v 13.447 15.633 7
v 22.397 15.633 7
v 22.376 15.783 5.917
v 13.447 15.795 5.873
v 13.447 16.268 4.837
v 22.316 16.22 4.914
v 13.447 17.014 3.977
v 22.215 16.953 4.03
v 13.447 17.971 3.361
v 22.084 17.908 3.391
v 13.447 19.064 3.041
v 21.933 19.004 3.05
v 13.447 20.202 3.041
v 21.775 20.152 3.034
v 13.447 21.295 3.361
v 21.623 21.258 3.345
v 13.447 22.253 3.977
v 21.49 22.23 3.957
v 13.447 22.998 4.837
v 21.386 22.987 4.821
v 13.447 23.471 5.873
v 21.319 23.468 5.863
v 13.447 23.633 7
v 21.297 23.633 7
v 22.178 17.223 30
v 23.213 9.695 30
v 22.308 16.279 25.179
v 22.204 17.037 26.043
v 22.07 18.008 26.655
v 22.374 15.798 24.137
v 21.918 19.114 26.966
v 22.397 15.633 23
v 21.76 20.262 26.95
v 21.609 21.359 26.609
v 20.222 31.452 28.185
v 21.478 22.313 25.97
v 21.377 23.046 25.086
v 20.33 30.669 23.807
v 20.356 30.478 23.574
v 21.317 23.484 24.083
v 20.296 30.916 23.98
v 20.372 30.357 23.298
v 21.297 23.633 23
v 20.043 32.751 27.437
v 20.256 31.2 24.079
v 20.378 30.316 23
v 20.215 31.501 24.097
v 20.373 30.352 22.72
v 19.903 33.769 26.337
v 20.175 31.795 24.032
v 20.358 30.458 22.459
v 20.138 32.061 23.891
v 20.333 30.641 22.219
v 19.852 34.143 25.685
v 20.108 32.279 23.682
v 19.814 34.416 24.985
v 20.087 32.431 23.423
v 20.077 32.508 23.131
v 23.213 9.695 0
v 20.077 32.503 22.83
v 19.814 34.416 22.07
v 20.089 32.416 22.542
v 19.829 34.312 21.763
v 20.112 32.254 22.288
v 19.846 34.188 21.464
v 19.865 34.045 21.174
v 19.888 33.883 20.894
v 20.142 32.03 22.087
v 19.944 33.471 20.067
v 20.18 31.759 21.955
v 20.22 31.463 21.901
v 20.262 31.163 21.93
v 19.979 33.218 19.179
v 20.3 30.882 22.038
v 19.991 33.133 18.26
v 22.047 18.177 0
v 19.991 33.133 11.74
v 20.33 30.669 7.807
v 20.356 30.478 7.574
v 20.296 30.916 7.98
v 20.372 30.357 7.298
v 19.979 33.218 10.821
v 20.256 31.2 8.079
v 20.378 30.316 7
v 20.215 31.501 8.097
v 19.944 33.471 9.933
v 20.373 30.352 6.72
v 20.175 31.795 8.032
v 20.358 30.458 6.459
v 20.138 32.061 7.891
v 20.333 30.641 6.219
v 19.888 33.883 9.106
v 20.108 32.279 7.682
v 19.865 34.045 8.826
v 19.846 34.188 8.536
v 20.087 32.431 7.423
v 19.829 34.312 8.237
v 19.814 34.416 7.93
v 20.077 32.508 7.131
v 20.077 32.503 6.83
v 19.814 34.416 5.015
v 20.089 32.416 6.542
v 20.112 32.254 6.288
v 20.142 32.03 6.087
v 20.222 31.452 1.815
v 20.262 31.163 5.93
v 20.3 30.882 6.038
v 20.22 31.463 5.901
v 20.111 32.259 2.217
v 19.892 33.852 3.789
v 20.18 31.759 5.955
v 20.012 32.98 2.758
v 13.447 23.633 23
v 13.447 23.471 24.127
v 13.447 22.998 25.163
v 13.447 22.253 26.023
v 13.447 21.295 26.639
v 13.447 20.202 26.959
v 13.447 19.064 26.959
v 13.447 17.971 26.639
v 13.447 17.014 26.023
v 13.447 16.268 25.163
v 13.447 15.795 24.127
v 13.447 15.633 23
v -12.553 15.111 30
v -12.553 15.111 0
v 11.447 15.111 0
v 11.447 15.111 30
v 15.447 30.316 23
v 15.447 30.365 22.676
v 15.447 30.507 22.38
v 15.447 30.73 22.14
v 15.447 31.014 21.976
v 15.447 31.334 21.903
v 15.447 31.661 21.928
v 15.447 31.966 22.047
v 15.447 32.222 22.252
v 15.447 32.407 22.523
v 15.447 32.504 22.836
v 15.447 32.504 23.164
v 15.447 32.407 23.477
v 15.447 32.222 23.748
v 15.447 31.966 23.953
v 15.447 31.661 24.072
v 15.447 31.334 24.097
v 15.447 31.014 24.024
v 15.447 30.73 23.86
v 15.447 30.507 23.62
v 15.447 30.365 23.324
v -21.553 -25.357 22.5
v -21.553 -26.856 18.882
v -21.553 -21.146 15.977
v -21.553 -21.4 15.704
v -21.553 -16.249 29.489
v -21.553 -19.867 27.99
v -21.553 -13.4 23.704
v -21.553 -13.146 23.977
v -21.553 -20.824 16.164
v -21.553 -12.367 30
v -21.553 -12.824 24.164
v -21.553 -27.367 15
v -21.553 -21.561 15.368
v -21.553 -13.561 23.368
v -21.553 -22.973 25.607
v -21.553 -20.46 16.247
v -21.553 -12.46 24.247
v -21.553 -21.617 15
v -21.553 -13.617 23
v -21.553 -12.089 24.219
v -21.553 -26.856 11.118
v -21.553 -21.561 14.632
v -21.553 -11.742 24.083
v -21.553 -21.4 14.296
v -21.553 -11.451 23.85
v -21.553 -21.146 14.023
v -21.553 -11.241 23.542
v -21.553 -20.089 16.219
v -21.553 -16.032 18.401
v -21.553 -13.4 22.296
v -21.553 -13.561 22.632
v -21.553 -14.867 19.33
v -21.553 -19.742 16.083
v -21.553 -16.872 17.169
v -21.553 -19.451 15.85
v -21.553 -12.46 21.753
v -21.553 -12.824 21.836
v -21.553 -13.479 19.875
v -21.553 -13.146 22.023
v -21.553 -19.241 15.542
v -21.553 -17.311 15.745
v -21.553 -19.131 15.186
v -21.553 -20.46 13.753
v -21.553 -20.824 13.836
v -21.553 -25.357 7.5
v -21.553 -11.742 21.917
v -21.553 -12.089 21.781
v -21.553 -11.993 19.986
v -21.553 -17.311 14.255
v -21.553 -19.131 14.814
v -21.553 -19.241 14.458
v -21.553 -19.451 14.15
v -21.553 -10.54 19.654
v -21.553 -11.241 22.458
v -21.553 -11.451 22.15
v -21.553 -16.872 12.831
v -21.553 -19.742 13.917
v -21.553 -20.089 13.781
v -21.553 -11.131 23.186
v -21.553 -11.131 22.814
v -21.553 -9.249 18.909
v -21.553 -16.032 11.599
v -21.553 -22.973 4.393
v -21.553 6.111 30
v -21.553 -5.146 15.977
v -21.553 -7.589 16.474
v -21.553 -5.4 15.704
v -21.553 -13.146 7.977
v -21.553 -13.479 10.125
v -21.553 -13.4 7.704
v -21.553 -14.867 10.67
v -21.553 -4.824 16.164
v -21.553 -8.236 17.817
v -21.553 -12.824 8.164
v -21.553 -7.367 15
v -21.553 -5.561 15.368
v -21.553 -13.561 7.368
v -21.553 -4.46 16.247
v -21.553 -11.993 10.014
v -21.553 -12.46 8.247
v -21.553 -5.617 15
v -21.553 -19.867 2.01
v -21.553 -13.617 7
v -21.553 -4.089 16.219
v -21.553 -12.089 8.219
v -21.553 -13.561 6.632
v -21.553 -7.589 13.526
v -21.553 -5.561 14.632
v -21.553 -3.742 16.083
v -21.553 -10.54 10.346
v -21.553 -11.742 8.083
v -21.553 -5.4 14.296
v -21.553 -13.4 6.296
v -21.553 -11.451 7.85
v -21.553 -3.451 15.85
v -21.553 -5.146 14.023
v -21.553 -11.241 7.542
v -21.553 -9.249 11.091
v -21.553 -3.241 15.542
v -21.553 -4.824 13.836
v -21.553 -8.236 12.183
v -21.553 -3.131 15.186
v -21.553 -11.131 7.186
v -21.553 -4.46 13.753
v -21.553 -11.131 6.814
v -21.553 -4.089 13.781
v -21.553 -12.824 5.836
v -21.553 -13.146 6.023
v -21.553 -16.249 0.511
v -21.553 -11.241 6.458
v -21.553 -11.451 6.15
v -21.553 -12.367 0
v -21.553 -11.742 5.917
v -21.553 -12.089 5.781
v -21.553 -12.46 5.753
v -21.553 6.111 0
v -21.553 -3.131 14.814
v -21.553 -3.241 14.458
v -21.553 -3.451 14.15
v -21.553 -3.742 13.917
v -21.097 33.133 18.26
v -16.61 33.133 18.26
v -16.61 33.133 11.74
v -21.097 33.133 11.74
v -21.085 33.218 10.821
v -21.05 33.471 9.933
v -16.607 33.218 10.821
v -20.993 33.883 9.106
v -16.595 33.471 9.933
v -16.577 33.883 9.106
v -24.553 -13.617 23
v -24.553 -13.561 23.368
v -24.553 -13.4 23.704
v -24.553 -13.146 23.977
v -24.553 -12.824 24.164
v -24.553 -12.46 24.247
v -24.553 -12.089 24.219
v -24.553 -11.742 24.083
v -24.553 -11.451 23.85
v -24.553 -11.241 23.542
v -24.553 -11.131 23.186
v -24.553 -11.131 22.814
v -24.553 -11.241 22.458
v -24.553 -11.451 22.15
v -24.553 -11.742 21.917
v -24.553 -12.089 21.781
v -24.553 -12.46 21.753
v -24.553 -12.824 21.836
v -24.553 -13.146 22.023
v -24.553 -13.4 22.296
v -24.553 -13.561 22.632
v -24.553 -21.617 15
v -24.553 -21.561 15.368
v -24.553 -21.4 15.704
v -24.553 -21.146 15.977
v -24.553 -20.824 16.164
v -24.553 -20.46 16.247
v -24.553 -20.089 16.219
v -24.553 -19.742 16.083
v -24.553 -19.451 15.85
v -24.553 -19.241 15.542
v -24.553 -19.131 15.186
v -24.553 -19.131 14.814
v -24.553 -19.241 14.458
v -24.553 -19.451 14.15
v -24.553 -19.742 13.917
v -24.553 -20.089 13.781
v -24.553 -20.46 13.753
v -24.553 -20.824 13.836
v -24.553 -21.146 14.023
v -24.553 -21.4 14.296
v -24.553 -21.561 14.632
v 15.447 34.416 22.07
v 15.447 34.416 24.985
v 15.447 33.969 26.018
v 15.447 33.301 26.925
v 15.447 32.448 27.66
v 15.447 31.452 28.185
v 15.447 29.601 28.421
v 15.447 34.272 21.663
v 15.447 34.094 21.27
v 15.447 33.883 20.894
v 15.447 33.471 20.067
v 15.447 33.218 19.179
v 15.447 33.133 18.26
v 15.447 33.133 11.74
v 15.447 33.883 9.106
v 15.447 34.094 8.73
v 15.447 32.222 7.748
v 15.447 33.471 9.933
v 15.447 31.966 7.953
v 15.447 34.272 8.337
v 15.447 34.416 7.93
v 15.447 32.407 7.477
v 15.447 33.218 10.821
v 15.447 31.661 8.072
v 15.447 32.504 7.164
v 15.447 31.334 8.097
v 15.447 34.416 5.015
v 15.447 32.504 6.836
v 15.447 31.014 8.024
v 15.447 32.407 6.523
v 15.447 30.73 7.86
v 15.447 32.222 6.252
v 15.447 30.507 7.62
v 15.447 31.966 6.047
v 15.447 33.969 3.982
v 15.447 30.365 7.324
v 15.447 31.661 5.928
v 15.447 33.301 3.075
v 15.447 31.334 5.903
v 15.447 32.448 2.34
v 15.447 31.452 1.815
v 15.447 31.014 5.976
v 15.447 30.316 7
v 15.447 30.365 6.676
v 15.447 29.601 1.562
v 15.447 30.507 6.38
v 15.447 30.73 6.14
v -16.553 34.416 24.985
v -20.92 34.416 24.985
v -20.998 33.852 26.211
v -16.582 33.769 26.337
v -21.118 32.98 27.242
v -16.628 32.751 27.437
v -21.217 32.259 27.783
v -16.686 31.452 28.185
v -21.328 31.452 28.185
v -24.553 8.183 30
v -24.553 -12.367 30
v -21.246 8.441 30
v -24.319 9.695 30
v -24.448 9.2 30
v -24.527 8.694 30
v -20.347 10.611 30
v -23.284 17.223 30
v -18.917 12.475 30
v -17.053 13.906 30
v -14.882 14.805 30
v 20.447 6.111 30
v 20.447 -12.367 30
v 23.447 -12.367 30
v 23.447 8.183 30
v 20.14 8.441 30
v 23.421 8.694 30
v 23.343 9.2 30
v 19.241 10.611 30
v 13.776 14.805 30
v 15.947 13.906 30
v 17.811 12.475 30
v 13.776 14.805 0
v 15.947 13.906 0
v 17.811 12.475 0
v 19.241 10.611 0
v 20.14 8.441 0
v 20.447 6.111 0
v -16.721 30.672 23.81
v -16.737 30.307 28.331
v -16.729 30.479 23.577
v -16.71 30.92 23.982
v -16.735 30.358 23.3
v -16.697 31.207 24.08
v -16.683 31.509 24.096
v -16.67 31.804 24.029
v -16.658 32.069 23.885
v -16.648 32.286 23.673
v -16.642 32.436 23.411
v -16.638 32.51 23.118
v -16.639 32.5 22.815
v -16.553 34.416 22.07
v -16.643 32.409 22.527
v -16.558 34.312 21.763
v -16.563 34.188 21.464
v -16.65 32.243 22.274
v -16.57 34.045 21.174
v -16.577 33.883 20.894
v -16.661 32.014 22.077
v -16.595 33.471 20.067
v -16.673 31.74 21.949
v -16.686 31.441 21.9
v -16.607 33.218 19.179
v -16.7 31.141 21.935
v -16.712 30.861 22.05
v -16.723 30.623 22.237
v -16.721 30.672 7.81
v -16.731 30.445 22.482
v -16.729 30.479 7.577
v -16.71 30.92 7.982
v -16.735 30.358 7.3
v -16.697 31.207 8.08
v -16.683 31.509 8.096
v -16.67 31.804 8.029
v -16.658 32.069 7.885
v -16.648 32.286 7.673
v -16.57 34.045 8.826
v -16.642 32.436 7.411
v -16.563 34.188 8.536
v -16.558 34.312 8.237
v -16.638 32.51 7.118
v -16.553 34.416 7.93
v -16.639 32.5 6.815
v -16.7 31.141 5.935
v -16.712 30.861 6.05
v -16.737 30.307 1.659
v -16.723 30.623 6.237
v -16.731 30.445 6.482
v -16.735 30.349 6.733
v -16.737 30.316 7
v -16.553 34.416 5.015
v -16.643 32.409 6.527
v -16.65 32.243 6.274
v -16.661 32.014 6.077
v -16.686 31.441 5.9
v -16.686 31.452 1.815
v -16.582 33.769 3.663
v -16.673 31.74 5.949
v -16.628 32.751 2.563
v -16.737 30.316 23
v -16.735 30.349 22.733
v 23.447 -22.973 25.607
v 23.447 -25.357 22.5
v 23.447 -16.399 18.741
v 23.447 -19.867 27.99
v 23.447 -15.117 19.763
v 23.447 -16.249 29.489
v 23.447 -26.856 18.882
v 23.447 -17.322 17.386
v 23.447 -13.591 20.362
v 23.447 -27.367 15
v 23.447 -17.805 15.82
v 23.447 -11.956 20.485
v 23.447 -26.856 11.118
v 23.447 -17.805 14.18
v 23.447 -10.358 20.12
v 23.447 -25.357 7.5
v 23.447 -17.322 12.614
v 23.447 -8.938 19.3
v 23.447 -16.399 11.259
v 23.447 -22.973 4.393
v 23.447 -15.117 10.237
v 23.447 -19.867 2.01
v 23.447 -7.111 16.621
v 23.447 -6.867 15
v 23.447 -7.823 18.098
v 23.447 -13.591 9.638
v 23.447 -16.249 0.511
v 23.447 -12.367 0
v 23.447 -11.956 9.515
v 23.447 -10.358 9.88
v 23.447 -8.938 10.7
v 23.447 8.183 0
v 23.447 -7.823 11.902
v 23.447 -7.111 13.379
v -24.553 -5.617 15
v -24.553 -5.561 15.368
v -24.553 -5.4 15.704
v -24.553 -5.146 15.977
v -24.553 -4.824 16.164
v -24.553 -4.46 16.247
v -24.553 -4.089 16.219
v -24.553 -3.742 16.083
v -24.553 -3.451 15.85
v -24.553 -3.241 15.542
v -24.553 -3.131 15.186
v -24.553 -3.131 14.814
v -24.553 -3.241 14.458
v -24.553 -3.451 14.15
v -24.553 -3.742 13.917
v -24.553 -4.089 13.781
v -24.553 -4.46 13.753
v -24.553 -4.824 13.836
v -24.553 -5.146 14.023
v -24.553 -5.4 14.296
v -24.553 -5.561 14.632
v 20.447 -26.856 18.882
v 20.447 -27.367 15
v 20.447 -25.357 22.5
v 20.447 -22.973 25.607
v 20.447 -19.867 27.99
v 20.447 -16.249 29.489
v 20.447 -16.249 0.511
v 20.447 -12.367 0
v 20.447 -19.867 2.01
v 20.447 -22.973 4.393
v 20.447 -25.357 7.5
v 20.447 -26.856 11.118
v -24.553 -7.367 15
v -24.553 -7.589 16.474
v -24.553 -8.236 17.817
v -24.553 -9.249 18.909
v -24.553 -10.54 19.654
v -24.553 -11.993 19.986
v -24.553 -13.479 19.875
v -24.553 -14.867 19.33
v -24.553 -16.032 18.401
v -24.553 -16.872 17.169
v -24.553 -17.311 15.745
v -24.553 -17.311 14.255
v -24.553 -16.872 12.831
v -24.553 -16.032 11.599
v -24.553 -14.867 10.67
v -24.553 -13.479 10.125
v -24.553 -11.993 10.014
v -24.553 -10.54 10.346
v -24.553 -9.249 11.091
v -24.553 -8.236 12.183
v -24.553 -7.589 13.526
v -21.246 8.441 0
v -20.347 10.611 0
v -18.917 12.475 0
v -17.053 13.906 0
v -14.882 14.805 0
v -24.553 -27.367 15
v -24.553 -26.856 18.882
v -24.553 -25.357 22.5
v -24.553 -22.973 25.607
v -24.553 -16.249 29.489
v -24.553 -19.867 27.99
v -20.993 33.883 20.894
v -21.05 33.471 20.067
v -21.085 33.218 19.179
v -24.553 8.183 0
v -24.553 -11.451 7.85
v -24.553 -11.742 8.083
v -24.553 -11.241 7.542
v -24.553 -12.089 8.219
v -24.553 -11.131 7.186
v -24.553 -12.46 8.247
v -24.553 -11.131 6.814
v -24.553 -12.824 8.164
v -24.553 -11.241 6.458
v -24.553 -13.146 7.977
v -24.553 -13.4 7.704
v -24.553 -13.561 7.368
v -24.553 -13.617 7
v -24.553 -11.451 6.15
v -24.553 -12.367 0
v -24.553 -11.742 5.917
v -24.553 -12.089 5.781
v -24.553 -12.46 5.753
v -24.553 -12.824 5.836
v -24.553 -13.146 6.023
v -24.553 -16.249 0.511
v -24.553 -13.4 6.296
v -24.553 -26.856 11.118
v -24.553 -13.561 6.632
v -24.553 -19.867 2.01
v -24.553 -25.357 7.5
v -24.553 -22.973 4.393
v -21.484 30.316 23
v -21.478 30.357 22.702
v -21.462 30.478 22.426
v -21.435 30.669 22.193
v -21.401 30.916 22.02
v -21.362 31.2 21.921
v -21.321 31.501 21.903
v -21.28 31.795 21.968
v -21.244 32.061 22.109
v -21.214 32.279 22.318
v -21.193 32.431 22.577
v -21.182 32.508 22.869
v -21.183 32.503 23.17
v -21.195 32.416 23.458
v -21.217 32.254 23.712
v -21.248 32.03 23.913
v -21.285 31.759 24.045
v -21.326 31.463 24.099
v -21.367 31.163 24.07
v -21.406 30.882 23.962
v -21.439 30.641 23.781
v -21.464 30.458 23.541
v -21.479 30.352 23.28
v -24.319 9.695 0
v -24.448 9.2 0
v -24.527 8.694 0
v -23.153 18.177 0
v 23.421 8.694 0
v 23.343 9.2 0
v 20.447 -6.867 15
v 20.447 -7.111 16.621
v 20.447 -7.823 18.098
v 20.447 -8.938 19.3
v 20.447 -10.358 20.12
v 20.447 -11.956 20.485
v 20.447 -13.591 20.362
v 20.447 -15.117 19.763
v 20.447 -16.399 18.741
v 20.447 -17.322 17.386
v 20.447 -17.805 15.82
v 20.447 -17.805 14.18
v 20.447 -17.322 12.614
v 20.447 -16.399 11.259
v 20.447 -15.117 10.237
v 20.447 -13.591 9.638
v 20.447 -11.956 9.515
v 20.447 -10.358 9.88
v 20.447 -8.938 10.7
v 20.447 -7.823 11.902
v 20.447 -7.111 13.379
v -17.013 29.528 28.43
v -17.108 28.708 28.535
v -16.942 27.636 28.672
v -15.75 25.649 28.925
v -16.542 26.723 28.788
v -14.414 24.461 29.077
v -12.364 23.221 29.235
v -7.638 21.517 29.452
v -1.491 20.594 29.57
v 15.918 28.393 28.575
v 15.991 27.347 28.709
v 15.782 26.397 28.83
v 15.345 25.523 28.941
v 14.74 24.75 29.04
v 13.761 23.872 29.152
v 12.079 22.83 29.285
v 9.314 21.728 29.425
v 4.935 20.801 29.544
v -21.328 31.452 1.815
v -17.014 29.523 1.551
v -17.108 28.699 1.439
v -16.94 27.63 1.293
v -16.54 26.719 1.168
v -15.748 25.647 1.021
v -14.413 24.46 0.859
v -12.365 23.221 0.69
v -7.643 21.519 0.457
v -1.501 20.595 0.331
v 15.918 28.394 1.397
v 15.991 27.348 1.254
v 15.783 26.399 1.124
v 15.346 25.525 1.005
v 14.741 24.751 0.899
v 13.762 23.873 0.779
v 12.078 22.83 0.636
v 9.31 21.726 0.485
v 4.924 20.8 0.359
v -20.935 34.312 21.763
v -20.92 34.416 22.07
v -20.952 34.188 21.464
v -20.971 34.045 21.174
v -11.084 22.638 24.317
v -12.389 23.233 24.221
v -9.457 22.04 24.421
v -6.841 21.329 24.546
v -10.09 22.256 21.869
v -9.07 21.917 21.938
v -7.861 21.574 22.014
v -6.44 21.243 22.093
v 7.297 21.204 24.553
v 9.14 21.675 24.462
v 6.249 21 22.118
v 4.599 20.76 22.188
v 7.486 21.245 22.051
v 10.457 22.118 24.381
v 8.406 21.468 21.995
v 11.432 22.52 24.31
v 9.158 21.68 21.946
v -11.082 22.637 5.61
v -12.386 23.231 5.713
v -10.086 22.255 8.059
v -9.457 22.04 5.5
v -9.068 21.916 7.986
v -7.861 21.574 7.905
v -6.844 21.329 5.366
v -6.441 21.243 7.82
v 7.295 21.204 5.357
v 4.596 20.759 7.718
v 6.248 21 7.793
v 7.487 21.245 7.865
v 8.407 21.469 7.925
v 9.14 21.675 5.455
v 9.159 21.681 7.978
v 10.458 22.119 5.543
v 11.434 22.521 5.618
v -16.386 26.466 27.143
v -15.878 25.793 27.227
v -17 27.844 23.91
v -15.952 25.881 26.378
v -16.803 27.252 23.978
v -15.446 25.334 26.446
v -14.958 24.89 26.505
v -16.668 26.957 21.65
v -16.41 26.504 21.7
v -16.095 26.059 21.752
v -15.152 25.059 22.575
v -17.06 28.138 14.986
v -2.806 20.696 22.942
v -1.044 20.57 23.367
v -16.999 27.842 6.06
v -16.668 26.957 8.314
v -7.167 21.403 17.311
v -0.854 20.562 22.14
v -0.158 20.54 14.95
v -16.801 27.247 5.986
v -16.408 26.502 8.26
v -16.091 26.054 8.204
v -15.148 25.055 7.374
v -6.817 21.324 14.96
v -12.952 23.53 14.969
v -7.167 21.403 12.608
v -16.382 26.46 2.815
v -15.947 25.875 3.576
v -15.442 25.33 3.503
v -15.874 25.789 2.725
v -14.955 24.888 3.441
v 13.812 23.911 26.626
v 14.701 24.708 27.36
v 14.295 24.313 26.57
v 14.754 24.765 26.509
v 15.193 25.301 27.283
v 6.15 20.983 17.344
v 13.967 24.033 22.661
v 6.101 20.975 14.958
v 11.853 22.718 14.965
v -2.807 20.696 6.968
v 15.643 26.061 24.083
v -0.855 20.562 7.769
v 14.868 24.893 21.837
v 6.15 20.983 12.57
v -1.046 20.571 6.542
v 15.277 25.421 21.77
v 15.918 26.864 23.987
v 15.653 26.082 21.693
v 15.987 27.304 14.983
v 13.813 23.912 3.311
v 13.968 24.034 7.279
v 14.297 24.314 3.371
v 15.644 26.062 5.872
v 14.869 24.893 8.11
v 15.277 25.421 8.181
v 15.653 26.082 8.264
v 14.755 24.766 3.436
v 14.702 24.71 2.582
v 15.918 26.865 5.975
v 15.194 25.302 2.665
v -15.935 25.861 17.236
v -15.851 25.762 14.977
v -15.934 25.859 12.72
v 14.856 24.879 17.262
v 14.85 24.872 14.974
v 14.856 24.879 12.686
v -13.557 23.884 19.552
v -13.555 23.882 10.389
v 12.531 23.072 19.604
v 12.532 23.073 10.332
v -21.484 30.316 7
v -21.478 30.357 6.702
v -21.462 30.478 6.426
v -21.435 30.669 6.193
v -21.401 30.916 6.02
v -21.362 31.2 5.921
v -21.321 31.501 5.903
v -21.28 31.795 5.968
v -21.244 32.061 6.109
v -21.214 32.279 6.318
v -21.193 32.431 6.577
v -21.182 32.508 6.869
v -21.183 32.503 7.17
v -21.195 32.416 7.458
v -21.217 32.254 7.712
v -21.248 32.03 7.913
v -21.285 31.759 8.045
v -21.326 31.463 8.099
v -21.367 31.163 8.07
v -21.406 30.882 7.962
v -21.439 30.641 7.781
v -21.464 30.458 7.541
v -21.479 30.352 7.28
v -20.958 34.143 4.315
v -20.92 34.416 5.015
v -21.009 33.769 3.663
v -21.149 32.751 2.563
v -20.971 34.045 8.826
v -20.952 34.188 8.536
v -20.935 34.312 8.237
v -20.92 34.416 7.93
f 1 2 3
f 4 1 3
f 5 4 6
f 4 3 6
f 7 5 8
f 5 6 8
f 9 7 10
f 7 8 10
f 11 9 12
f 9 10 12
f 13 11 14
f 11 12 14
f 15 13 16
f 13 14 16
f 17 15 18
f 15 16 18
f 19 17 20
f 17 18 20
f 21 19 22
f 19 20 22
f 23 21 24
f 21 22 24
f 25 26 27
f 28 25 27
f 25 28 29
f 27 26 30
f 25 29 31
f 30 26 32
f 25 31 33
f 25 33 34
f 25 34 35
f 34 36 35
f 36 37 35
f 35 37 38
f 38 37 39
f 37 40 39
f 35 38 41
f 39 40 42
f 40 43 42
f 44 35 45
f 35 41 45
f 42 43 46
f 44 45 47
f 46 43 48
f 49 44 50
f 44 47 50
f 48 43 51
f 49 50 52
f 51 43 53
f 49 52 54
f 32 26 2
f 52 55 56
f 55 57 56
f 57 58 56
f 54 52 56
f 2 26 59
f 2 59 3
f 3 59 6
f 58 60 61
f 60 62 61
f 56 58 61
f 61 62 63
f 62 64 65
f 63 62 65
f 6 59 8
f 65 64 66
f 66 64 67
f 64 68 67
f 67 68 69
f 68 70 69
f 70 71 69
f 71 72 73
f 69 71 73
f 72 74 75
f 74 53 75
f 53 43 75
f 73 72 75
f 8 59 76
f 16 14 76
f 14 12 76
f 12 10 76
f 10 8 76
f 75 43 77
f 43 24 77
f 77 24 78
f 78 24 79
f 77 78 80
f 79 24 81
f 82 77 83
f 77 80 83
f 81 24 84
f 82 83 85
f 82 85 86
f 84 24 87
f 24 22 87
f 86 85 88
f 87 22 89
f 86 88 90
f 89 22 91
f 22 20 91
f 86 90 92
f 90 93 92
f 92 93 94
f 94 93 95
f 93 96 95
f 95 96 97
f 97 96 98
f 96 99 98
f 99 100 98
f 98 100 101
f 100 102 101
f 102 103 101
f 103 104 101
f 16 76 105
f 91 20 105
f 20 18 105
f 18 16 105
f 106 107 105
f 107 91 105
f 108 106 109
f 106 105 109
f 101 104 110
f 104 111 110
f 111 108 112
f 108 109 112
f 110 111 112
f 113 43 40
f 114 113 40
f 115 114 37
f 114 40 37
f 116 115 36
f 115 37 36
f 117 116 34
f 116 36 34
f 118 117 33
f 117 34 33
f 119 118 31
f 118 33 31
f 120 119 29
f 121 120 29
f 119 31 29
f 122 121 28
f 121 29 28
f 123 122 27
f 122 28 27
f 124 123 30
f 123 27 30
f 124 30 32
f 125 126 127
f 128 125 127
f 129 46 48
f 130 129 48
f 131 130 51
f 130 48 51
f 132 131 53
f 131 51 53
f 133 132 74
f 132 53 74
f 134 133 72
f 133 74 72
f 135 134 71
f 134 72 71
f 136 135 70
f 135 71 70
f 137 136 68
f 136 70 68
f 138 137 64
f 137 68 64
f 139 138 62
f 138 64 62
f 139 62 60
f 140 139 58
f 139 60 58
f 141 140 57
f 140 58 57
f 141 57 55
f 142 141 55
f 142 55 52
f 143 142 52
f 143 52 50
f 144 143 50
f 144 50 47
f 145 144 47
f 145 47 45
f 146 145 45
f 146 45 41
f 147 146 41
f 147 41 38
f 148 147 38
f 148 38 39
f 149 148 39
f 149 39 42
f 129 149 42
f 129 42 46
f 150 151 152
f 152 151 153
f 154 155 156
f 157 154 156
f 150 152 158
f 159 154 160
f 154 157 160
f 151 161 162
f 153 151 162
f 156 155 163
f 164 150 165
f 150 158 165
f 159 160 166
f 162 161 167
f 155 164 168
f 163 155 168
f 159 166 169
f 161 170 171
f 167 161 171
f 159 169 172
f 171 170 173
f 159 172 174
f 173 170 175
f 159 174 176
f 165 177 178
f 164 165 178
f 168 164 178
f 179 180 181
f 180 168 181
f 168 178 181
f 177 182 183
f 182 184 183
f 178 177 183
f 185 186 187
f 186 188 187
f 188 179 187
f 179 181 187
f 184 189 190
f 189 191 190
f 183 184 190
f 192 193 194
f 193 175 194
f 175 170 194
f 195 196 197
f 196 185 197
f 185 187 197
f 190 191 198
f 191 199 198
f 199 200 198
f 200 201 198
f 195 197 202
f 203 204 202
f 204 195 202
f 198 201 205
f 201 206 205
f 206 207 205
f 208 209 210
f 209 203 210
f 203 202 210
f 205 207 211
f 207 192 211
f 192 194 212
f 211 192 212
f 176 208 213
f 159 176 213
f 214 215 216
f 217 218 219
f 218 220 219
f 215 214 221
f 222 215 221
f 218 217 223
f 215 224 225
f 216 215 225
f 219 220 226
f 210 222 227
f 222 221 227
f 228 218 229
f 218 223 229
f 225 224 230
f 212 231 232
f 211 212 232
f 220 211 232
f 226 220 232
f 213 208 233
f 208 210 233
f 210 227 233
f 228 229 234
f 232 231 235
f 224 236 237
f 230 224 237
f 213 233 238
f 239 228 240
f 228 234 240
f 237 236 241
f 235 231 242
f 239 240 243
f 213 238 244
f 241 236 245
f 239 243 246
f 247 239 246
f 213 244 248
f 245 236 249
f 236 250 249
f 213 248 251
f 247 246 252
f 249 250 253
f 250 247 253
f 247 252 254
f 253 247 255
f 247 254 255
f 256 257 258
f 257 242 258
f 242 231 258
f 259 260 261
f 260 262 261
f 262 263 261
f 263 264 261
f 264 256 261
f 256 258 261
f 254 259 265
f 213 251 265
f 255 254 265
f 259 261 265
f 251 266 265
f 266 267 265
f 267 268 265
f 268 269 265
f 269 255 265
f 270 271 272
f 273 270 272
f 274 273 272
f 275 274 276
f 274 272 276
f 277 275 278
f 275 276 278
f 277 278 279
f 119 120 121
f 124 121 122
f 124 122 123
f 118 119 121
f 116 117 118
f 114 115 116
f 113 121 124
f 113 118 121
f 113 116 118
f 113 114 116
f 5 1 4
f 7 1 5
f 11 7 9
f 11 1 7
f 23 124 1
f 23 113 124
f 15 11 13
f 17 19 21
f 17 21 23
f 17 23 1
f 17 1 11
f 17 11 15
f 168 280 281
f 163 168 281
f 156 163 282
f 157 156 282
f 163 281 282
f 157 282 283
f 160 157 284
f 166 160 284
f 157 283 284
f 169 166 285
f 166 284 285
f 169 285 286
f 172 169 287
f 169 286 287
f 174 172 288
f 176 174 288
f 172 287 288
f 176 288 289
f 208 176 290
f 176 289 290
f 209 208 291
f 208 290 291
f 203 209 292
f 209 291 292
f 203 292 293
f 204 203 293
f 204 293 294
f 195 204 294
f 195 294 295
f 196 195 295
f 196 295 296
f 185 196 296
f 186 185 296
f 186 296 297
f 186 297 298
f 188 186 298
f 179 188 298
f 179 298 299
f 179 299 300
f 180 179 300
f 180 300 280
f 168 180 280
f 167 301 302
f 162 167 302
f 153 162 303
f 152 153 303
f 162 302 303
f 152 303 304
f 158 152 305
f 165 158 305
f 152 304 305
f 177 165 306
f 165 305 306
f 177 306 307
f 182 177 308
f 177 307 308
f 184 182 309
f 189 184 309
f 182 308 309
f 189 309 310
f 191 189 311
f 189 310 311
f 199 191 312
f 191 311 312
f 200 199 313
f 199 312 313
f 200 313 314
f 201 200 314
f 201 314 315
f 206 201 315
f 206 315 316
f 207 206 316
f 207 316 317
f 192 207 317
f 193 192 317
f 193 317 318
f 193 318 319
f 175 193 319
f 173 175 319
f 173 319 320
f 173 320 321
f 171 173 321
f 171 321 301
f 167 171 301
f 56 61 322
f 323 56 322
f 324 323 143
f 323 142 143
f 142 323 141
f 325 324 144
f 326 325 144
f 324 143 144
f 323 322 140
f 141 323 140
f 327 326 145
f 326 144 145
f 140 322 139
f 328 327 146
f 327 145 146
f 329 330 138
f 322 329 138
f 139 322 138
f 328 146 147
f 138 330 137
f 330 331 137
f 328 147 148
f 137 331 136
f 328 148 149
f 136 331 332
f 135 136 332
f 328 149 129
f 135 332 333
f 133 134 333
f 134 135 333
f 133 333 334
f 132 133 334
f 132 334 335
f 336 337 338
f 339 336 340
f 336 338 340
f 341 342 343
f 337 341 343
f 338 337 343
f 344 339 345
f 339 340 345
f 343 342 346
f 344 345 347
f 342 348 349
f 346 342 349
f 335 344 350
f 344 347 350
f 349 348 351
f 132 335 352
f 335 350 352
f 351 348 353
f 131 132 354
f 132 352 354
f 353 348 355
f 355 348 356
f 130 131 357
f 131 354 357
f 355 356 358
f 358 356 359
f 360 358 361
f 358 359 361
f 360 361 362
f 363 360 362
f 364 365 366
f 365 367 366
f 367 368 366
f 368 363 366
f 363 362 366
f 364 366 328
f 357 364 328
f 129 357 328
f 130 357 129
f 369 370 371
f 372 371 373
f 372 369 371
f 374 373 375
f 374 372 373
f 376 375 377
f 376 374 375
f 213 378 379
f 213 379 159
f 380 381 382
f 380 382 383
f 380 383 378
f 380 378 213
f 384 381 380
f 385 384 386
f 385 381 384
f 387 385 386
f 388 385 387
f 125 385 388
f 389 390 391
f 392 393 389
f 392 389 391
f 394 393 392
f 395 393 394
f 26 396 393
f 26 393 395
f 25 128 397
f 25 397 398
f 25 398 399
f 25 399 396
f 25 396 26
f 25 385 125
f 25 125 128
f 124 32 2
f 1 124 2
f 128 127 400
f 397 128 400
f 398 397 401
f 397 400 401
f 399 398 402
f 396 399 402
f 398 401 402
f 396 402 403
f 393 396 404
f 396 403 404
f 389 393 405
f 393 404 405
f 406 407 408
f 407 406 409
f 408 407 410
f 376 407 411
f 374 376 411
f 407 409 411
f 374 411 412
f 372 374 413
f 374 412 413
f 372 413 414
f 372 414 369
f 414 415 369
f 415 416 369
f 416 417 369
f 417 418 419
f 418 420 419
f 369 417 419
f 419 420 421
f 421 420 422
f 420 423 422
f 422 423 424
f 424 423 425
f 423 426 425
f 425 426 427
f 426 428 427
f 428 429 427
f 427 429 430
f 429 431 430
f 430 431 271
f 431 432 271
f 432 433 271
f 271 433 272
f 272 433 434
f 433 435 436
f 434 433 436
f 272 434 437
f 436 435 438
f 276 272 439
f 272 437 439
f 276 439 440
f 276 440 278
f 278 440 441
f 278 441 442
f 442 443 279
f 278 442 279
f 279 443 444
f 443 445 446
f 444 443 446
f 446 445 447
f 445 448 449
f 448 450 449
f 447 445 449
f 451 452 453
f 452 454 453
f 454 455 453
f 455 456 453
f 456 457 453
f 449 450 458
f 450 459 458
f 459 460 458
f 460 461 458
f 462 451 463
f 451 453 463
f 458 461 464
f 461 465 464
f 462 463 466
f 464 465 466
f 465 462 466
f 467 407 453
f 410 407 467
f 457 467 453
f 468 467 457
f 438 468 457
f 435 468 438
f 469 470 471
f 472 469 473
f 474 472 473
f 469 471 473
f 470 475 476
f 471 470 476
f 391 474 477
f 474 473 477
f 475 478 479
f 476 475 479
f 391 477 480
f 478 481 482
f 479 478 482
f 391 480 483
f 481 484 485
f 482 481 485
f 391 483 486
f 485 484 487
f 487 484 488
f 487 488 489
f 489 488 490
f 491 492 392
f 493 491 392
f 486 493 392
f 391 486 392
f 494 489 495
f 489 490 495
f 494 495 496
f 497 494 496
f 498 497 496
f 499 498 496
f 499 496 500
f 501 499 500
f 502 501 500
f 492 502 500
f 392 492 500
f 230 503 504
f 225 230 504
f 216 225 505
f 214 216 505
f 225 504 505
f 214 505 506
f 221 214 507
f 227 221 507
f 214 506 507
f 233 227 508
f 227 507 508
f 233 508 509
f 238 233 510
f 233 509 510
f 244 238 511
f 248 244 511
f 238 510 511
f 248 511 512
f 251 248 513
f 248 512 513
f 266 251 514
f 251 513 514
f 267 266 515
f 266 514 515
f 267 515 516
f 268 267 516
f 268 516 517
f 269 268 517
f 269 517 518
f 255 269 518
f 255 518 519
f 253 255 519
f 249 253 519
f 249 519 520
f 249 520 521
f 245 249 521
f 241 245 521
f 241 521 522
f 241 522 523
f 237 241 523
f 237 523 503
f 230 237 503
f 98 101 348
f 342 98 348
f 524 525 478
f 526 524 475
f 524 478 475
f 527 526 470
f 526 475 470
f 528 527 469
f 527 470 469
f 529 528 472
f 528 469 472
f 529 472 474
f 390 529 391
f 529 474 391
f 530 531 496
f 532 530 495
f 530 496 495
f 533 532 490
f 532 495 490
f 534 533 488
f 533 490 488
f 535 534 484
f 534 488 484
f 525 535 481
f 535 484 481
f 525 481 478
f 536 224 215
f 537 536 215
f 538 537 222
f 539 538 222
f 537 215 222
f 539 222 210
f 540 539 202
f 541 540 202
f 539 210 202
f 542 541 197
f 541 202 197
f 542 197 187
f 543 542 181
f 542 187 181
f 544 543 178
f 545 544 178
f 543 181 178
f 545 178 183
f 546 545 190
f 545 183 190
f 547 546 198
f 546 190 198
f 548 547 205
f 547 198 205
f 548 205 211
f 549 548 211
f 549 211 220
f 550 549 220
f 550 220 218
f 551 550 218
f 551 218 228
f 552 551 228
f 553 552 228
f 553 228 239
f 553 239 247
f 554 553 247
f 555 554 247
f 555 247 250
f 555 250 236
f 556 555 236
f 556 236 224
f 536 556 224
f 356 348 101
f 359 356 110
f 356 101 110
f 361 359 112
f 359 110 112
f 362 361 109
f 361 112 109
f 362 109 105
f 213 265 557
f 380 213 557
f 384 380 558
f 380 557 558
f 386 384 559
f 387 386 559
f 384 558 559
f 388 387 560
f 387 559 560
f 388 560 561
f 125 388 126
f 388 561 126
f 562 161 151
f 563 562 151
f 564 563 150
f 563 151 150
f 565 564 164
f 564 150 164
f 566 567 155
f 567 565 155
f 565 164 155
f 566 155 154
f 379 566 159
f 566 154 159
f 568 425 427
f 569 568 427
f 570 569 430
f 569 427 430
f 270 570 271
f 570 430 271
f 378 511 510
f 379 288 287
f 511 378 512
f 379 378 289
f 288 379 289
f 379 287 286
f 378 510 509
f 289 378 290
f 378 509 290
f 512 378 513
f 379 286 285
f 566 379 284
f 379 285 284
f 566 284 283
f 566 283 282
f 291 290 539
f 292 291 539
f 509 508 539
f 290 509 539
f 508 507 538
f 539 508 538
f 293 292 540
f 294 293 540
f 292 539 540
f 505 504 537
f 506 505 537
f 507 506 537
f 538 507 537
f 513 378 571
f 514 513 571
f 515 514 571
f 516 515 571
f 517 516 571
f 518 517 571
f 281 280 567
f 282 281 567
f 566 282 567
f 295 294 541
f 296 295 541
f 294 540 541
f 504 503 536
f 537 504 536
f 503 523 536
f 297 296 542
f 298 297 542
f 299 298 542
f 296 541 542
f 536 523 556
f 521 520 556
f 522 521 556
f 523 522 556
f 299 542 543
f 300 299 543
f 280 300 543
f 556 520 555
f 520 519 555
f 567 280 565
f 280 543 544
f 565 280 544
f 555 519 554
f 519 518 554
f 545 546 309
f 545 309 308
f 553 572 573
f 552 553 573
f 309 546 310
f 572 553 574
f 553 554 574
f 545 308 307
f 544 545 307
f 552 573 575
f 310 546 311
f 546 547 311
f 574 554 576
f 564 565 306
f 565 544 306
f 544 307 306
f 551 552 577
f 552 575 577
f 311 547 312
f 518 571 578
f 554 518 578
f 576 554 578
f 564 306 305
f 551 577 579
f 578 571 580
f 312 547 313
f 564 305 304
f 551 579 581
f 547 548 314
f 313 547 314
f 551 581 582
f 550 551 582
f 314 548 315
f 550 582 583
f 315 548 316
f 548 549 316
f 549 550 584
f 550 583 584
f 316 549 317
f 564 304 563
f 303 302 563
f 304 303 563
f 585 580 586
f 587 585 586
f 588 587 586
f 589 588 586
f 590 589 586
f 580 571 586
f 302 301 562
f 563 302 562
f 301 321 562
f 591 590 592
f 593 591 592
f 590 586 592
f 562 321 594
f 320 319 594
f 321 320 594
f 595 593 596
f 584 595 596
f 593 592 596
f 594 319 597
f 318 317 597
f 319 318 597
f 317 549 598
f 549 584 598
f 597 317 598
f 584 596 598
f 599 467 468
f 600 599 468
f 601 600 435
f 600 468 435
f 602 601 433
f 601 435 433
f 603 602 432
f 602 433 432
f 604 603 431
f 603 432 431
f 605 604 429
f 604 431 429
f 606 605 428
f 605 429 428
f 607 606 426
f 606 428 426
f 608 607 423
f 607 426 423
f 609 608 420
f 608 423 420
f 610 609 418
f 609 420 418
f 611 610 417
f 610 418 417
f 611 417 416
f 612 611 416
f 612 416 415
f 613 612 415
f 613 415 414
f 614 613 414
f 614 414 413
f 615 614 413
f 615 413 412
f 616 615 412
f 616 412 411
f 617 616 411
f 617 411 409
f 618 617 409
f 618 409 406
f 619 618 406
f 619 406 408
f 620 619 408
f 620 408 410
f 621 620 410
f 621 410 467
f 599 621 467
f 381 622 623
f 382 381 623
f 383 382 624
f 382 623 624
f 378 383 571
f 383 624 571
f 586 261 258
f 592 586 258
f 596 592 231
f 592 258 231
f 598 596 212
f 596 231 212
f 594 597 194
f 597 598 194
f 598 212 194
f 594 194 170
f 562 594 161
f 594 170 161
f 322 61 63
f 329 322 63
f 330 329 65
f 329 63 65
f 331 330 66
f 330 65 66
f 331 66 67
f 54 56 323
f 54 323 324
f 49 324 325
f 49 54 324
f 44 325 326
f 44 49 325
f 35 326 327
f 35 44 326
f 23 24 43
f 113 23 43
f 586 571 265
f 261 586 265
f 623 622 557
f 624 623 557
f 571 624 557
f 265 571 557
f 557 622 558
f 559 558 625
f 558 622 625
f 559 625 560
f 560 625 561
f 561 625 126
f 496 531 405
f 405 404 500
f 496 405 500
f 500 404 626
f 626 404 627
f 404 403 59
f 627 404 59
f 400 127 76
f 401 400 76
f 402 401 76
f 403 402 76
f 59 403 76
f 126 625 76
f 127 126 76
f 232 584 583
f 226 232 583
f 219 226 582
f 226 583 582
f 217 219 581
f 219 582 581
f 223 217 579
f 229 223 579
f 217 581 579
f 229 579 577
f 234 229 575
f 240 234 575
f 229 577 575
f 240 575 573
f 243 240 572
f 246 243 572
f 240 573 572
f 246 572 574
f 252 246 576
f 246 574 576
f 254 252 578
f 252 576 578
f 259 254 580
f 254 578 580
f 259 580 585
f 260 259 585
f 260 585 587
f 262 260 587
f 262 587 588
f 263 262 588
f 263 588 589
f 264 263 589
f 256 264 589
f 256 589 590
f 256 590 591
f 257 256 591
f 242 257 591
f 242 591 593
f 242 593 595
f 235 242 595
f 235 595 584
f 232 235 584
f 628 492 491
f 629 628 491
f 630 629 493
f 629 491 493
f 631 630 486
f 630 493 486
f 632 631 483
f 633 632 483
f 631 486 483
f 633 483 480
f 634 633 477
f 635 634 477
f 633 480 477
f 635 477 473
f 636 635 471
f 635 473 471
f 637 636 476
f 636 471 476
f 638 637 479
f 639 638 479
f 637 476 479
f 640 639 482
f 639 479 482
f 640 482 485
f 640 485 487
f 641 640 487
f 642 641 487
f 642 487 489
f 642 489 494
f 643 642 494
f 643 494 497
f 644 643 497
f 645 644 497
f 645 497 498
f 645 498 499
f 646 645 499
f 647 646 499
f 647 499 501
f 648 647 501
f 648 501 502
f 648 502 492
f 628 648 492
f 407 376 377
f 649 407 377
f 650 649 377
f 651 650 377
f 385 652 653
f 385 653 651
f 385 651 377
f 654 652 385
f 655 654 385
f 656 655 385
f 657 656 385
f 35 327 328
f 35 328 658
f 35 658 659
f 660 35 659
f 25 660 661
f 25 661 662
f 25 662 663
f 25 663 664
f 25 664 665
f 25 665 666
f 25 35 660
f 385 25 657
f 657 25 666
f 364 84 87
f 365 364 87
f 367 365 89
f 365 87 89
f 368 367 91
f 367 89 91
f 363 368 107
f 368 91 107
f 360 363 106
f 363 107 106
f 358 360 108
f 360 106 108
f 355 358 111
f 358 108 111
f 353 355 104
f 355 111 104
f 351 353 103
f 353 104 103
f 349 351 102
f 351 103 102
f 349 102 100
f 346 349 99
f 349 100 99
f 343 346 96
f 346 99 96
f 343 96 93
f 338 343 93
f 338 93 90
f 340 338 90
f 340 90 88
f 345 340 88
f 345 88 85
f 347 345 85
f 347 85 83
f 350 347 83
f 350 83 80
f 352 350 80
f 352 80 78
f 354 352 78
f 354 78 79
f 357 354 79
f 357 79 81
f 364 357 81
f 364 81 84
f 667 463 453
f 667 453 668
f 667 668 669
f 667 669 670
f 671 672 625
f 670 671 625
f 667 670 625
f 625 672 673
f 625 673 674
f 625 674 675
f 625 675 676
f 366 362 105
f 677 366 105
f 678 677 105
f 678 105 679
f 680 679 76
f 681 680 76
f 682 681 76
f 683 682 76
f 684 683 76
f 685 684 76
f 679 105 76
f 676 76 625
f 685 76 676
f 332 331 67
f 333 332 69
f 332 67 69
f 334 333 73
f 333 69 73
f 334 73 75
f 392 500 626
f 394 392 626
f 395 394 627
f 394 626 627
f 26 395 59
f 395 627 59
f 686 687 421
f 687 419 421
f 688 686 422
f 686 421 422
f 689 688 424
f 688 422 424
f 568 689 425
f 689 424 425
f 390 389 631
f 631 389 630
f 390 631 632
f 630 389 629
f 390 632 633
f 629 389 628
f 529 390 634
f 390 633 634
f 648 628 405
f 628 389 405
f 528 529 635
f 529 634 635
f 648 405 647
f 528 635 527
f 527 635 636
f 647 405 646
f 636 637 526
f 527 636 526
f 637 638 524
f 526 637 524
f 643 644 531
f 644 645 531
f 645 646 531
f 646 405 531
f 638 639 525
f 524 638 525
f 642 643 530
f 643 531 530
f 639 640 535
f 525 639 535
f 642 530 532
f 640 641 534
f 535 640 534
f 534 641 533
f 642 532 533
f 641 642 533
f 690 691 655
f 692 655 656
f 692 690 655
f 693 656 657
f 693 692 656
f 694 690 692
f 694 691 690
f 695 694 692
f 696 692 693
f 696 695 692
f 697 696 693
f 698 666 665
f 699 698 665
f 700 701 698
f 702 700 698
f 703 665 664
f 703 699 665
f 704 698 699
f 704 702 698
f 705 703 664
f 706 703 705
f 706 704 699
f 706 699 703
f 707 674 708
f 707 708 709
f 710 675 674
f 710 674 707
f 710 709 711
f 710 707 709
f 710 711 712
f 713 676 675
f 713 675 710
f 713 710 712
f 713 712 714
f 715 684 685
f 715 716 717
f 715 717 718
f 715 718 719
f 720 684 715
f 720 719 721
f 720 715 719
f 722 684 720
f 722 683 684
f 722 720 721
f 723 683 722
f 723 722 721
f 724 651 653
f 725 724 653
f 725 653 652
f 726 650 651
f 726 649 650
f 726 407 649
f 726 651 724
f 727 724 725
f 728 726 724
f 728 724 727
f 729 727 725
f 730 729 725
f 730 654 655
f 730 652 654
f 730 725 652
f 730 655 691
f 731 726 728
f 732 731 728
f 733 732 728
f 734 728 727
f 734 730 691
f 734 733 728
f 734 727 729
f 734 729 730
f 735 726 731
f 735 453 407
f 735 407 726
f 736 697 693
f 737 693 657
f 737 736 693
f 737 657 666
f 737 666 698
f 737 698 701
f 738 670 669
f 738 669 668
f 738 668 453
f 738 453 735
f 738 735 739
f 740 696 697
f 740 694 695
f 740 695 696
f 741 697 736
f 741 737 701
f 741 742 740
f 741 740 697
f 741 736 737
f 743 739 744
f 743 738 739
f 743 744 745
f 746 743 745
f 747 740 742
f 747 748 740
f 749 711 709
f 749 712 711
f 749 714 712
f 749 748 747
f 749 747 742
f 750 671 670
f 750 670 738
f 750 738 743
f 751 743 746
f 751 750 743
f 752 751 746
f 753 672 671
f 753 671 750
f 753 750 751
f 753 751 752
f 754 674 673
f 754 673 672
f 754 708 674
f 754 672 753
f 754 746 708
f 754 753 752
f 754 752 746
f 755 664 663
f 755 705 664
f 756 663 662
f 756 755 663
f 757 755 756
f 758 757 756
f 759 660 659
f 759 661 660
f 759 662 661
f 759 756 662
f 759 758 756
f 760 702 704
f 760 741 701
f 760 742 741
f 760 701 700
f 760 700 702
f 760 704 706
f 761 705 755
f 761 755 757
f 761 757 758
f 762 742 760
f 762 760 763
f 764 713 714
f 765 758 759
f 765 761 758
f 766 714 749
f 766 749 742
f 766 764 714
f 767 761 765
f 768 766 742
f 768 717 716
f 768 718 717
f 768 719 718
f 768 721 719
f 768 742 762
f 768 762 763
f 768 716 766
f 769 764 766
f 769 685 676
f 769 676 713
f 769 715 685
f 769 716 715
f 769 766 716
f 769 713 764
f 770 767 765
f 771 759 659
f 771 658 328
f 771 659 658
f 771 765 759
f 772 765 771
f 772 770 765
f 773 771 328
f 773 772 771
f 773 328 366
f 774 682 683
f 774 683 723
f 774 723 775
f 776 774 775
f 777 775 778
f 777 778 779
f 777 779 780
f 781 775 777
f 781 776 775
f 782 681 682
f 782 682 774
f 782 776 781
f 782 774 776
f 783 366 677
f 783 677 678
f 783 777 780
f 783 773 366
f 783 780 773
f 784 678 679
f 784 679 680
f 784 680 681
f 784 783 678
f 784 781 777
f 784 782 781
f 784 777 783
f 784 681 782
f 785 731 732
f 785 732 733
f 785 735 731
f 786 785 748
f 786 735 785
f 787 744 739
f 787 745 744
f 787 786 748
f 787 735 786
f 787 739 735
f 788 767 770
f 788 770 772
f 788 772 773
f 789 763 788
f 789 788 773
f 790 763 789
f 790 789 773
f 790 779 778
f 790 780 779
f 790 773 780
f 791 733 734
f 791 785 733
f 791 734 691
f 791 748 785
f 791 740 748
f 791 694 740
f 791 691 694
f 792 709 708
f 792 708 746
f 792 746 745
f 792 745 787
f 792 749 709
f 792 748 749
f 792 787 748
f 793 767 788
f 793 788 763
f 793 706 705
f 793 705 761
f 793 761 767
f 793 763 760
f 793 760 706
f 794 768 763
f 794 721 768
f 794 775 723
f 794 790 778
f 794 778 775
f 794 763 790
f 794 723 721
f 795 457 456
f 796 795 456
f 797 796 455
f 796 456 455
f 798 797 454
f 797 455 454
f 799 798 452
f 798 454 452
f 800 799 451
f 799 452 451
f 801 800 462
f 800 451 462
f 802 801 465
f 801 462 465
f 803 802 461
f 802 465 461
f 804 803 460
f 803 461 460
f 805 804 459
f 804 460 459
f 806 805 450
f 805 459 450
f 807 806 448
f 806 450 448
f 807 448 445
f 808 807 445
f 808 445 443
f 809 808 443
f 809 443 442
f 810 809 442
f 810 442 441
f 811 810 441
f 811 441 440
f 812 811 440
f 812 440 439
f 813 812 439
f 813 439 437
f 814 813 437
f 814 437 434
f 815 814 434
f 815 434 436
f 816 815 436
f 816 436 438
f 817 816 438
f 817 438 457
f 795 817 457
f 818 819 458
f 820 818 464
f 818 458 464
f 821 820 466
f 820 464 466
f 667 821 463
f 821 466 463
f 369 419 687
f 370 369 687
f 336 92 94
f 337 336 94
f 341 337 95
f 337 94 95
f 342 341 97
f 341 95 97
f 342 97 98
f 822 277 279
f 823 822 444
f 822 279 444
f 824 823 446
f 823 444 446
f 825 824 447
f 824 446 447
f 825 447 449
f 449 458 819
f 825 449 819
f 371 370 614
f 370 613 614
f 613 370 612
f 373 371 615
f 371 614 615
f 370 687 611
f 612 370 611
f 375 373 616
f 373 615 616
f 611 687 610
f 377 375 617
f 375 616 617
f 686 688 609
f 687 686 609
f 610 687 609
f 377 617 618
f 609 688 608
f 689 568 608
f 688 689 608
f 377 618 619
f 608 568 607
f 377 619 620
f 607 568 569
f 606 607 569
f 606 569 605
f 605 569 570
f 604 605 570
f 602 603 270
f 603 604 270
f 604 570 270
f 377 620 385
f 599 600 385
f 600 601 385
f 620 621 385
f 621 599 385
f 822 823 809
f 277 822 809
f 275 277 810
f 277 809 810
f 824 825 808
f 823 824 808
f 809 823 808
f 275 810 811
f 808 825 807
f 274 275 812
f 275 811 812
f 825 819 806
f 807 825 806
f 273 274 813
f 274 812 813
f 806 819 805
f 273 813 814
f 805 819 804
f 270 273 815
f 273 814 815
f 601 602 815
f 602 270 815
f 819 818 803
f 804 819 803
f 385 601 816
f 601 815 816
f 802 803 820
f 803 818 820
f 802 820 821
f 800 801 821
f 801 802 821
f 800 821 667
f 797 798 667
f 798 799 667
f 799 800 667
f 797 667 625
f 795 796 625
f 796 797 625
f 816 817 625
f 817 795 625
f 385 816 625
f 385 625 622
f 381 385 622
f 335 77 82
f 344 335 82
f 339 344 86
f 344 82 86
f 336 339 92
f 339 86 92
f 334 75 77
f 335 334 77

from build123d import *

# Parameters (mm, degrees)
EXTRUDE_1_DEPTH      = 30
SKETCH_3_R           = 5
CUT_EXTRUDE_5_DEPTH  = 56
CUT_EXTRUDE_12_DEPTH = 51
SKETCH_3_4_R         = 1.1
CUT_EXTRUDE_7_DEPTH  = 56
SKETCH_6_R           = 1.25
CUT_EXTRUDE_9_DEPTH  = 22
SKETCH_5_R           = 5.5
CUT_EXTRUDE_13_DEPTH = 10


with BuildPart() as part:
    # Эскиз1 → Бобышка-Вытянуть1 (new body)
    with BuildSketch(Plane.XY):
        with BuildLine():
            ThreePointArc((23.447094189, 8.182803621), (23.388195094, 8.947997617), (23.212885448, 9.69516392))
            Line((23.212885448, 9.69516392), (19.814400159, 34.41595773))
            Line((19.814400159, 34.41595773), (15.447094189, 34.41595773))
            Line((15.447094189, 34.41595773), (15.447094189, 29.601114652))
            add(Edge.make_bspline(
                [(-16.737207413, 30.306768931), (-21.154797026, 21.000420448), (-0.15838441, 20.540065316), (20.838028206, 20.079710184), (15.447094189, 29.601114652)],
                knots=[2.948852751, 2.948852751, 2.948852751, 4.755403061, 4.755403061, 6.56195337, 6.56195337, 6.56195337], degree=2, weights=[1, 0.619041122, 1, 0.619041122, 1]))
            Line((-16.737207413, 30.306768931), (-16.552905811, 34.41595773))
            Line((-16.552905811, 34.41595773), (-20.92021178, 34.41595773))
            Line((-20.92021178, 34.41595773), (-24.31869707, 9.69516392))
            ThreePointArc((-24.31869707, 9.69516392), (-24.494006715, 8.947997617), (-24.552905811, 8.182803621))
            Line((-24.552905811, 8.182803621), (-24.552905811, -27.36689041))
            Line((-24.552905811, -27.36689041), (-21.552905811, -27.36689041))
            Line((-21.552905811, -27.36689041), (-21.552905811, 5.955043958))
            Line((-21.552905811, 5.955043958), (-21.552905811, 6.111376347))
            ThreePointArc((-21.552905811, 6.111376347), (-18.916866841, 12.475337378), (-12.552905811, 15.111376347))
            Line((-12.552905811, 15.111376347), (11.447094189, 15.111376347))
            ThreePointArc((11.447094189, 15.111376347), (17.81105522, 12.475337378), (20.447094189, 6.111376347))
            Line((20.447094189, 6.111376347), (20.447094189, 5.955043958))
            Line((20.447094189, 5.955043958), (20.447094189, -27.36689041))
            Line((20.447094189, -27.36689041), (23.447094189, -27.36689041))
            Line((23.447094189, -27.36689041), (23.447094189, 8.182803621))
        make_face()
    extrude(amount=EXTRUDE_1_DEPTH)

    # Эскиз3 → Вырез-Вытянуть5 (cut)
    with BuildSketch(Plane(origin=(23.447094189, 0, 0), x_dir=(0, 0, -1), z_dir=(1, 0, 0))):
        with Locations(Location((-15, -12.36689041, 0), (0, 0, 90))):
            Circle(SKETCH_3_R)
        with BuildLine():
            ThreePointArc((-15, -27.36689041), (-25.606601718, -22.973492128), (-30, -12.36689041))
            Line((-30, -12.36689041), (-30, -27.36689041))
            Line((-30, -27.36689041), (-15, -27.36689041))
        make_face()
        with BuildLine():
            ThreePointArc((0, -12.36689041), (-4.393398282, -22.973492128), (-15, -27.36689041))
            Line((-15, -27.36689041), (0, -27.36689041))
            Line((0, -27.36689041), (0, -12.36689041))
        make_face()
    extrude(amount=-CUT_EXTRUDE_5_DEPTH, mode=Mode.SUBTRACT)

    # Эскиз2 → Вырез-Вытянуть12 (cut)
    with BuildSketch(Plane(origin=(23.447094189, 0, 0), x_dir=(0, 0, -1), z_dir=(1, 0, 0))):
        with BuildLine():
            ThreePointArc((-23.527450038, 34.63310959), (-26.347454746, 33.761980313), (-28.184823989, 31.45213897))
            Line((-28.184823989, 31.45213897), (-30.35352757, 14.45213897))
            Line((-30.35352757, 14.45213897), (-30.35352757, 34.95213897))
            Line((-30.35352757, 34.95213897), (-23.527450038, 34.63310959))
        make_face()
        with BuildLine():
            Line((-18.259623162, 33.13310959), (-15, 33.13310959))
            Line((-15, 33.13310959), (-15, 34.63310959))
            Line((-15, 34.63310959), (-23.527450038, 34.63310959))
            ThreePointArc((-23.527450038, 34.63310959), (-22.158143644, 34.441955605), (-20.8935366, 33.88310959))
            ThreePointArc((-20.8935366, 33.88310959), (-19.628929556, 33.324263575), (-18.259623162, 33.13310959))
        make_face()
        with BuildLine():
            Line((-15, 34.63310959), (-15, 33.13310959))
            Line((-15, 33.13310959), (-11.740376838, 33.13310959))
            ThreePointArc((-11.740376838, 33.13310959), (-10.371070444, 33.324263575), (-9.1064634, 33.88310959))
            ThreePointArc((-9.1064634, 33.88310959), (-7.841856356, 34.441955605), (-6.472549962, 34.63310959))
            Line((-6.472549962, 34.63310959), (-15, 34.63310959))
        make_face()
        with BuildLine():
            Line((0.509110945, 34.95310959), (-6.472549962, 34.63310959))
            ThreePointArc((-6.472549962, 34.63310959), (-3.652545254, 33.761980313), (-1.815176011, 31.45213897))
            Line((-1.815176011, 31.45213897), (0.509110945, 14.45310959))
            Line((0.509110945, 14.45310959), (0.509110945, 34.95310959))
        make_face()
    extrude(amount=-CUT_EXTRUDE_12_DEPTH, mode=Mode.SUBTRACT)

    # Эскиз3<4> → Вырез-Вытянуть7 (cut)
    with BuildSketch(Plane(origin=(23.447094189, 0, 0), x_dir=(0, 0, -1), z_dir=(1, 0, 0))):
        with Locations(Location((-23, 31.41595774, 0), (0, 0, 270))):
            Circle(SKETCH_3_4_R)
        with Locations(Location((-7, 31.41595774, 0), (0, 0, 270))):
            Circle(SKETCH_3_4_R)
    extrude(amount=-CUT_EXTRUDE_7_DEPTH, mode=Mode.SUBTRACT)

    # Эскиз6 → Вырез-Вытянуть9 (cut)
    with BuildSketch(Plane.ZY.offset(24.552905811)):
        with Locations(Location((15, -4.36689041, 0), (0, 0, 270))):
            Circle(SKETCH_6_R)
        with Locations(Location((7, -12.36689041, 0), (0, 0, 270))):
            Circle(SKETCH_6_R)
        with Locations(Location((23, -12.36689041, 0), (0, 0, 270))):
            Circle(SKETCH_6_R)
        with Locations(Location((15, -20.36689041, 0), (0, 0, 270))):
            Circle(SKETCH_6_R)
    extrude(amount=-CUT_EXTRUDE_9_DEPTH, mode=Mode.SUBTRACT)

    # Эскиз5 → Вырез-Вытянуть13 (cut)
    with BuildSketch(Plane(origin=(23.447094189, 0, 0), x_dir=(0, 0, -1), z_dir=(1, 0, 0))):
        with Locations(Location((-15, -12.36689041, 0), (0, 0, 90))):
            Circle(SKETCH_5_R)
        with BuildLine():
            Line((-15, 23.63310959), (-23, 23.63310959))
            ThreePointArc((-23, 23.63310959), (-27, 19.63310959), (-23, 15.63310959))
            Line((-23, 15.63310959), (-7, 15.63310959))
            ThreePointArc((-7, 15.63310959), (-3, 19.63310959), (-7, 23.63310959))
            Line((-7, 23.63310959), (-15, 23.63310959))
        make_face()
    extrude(amount=-CUT_EXTRUDE_13_DEPTH, mode=Mode.SUBTRACT)


solid = part.part
